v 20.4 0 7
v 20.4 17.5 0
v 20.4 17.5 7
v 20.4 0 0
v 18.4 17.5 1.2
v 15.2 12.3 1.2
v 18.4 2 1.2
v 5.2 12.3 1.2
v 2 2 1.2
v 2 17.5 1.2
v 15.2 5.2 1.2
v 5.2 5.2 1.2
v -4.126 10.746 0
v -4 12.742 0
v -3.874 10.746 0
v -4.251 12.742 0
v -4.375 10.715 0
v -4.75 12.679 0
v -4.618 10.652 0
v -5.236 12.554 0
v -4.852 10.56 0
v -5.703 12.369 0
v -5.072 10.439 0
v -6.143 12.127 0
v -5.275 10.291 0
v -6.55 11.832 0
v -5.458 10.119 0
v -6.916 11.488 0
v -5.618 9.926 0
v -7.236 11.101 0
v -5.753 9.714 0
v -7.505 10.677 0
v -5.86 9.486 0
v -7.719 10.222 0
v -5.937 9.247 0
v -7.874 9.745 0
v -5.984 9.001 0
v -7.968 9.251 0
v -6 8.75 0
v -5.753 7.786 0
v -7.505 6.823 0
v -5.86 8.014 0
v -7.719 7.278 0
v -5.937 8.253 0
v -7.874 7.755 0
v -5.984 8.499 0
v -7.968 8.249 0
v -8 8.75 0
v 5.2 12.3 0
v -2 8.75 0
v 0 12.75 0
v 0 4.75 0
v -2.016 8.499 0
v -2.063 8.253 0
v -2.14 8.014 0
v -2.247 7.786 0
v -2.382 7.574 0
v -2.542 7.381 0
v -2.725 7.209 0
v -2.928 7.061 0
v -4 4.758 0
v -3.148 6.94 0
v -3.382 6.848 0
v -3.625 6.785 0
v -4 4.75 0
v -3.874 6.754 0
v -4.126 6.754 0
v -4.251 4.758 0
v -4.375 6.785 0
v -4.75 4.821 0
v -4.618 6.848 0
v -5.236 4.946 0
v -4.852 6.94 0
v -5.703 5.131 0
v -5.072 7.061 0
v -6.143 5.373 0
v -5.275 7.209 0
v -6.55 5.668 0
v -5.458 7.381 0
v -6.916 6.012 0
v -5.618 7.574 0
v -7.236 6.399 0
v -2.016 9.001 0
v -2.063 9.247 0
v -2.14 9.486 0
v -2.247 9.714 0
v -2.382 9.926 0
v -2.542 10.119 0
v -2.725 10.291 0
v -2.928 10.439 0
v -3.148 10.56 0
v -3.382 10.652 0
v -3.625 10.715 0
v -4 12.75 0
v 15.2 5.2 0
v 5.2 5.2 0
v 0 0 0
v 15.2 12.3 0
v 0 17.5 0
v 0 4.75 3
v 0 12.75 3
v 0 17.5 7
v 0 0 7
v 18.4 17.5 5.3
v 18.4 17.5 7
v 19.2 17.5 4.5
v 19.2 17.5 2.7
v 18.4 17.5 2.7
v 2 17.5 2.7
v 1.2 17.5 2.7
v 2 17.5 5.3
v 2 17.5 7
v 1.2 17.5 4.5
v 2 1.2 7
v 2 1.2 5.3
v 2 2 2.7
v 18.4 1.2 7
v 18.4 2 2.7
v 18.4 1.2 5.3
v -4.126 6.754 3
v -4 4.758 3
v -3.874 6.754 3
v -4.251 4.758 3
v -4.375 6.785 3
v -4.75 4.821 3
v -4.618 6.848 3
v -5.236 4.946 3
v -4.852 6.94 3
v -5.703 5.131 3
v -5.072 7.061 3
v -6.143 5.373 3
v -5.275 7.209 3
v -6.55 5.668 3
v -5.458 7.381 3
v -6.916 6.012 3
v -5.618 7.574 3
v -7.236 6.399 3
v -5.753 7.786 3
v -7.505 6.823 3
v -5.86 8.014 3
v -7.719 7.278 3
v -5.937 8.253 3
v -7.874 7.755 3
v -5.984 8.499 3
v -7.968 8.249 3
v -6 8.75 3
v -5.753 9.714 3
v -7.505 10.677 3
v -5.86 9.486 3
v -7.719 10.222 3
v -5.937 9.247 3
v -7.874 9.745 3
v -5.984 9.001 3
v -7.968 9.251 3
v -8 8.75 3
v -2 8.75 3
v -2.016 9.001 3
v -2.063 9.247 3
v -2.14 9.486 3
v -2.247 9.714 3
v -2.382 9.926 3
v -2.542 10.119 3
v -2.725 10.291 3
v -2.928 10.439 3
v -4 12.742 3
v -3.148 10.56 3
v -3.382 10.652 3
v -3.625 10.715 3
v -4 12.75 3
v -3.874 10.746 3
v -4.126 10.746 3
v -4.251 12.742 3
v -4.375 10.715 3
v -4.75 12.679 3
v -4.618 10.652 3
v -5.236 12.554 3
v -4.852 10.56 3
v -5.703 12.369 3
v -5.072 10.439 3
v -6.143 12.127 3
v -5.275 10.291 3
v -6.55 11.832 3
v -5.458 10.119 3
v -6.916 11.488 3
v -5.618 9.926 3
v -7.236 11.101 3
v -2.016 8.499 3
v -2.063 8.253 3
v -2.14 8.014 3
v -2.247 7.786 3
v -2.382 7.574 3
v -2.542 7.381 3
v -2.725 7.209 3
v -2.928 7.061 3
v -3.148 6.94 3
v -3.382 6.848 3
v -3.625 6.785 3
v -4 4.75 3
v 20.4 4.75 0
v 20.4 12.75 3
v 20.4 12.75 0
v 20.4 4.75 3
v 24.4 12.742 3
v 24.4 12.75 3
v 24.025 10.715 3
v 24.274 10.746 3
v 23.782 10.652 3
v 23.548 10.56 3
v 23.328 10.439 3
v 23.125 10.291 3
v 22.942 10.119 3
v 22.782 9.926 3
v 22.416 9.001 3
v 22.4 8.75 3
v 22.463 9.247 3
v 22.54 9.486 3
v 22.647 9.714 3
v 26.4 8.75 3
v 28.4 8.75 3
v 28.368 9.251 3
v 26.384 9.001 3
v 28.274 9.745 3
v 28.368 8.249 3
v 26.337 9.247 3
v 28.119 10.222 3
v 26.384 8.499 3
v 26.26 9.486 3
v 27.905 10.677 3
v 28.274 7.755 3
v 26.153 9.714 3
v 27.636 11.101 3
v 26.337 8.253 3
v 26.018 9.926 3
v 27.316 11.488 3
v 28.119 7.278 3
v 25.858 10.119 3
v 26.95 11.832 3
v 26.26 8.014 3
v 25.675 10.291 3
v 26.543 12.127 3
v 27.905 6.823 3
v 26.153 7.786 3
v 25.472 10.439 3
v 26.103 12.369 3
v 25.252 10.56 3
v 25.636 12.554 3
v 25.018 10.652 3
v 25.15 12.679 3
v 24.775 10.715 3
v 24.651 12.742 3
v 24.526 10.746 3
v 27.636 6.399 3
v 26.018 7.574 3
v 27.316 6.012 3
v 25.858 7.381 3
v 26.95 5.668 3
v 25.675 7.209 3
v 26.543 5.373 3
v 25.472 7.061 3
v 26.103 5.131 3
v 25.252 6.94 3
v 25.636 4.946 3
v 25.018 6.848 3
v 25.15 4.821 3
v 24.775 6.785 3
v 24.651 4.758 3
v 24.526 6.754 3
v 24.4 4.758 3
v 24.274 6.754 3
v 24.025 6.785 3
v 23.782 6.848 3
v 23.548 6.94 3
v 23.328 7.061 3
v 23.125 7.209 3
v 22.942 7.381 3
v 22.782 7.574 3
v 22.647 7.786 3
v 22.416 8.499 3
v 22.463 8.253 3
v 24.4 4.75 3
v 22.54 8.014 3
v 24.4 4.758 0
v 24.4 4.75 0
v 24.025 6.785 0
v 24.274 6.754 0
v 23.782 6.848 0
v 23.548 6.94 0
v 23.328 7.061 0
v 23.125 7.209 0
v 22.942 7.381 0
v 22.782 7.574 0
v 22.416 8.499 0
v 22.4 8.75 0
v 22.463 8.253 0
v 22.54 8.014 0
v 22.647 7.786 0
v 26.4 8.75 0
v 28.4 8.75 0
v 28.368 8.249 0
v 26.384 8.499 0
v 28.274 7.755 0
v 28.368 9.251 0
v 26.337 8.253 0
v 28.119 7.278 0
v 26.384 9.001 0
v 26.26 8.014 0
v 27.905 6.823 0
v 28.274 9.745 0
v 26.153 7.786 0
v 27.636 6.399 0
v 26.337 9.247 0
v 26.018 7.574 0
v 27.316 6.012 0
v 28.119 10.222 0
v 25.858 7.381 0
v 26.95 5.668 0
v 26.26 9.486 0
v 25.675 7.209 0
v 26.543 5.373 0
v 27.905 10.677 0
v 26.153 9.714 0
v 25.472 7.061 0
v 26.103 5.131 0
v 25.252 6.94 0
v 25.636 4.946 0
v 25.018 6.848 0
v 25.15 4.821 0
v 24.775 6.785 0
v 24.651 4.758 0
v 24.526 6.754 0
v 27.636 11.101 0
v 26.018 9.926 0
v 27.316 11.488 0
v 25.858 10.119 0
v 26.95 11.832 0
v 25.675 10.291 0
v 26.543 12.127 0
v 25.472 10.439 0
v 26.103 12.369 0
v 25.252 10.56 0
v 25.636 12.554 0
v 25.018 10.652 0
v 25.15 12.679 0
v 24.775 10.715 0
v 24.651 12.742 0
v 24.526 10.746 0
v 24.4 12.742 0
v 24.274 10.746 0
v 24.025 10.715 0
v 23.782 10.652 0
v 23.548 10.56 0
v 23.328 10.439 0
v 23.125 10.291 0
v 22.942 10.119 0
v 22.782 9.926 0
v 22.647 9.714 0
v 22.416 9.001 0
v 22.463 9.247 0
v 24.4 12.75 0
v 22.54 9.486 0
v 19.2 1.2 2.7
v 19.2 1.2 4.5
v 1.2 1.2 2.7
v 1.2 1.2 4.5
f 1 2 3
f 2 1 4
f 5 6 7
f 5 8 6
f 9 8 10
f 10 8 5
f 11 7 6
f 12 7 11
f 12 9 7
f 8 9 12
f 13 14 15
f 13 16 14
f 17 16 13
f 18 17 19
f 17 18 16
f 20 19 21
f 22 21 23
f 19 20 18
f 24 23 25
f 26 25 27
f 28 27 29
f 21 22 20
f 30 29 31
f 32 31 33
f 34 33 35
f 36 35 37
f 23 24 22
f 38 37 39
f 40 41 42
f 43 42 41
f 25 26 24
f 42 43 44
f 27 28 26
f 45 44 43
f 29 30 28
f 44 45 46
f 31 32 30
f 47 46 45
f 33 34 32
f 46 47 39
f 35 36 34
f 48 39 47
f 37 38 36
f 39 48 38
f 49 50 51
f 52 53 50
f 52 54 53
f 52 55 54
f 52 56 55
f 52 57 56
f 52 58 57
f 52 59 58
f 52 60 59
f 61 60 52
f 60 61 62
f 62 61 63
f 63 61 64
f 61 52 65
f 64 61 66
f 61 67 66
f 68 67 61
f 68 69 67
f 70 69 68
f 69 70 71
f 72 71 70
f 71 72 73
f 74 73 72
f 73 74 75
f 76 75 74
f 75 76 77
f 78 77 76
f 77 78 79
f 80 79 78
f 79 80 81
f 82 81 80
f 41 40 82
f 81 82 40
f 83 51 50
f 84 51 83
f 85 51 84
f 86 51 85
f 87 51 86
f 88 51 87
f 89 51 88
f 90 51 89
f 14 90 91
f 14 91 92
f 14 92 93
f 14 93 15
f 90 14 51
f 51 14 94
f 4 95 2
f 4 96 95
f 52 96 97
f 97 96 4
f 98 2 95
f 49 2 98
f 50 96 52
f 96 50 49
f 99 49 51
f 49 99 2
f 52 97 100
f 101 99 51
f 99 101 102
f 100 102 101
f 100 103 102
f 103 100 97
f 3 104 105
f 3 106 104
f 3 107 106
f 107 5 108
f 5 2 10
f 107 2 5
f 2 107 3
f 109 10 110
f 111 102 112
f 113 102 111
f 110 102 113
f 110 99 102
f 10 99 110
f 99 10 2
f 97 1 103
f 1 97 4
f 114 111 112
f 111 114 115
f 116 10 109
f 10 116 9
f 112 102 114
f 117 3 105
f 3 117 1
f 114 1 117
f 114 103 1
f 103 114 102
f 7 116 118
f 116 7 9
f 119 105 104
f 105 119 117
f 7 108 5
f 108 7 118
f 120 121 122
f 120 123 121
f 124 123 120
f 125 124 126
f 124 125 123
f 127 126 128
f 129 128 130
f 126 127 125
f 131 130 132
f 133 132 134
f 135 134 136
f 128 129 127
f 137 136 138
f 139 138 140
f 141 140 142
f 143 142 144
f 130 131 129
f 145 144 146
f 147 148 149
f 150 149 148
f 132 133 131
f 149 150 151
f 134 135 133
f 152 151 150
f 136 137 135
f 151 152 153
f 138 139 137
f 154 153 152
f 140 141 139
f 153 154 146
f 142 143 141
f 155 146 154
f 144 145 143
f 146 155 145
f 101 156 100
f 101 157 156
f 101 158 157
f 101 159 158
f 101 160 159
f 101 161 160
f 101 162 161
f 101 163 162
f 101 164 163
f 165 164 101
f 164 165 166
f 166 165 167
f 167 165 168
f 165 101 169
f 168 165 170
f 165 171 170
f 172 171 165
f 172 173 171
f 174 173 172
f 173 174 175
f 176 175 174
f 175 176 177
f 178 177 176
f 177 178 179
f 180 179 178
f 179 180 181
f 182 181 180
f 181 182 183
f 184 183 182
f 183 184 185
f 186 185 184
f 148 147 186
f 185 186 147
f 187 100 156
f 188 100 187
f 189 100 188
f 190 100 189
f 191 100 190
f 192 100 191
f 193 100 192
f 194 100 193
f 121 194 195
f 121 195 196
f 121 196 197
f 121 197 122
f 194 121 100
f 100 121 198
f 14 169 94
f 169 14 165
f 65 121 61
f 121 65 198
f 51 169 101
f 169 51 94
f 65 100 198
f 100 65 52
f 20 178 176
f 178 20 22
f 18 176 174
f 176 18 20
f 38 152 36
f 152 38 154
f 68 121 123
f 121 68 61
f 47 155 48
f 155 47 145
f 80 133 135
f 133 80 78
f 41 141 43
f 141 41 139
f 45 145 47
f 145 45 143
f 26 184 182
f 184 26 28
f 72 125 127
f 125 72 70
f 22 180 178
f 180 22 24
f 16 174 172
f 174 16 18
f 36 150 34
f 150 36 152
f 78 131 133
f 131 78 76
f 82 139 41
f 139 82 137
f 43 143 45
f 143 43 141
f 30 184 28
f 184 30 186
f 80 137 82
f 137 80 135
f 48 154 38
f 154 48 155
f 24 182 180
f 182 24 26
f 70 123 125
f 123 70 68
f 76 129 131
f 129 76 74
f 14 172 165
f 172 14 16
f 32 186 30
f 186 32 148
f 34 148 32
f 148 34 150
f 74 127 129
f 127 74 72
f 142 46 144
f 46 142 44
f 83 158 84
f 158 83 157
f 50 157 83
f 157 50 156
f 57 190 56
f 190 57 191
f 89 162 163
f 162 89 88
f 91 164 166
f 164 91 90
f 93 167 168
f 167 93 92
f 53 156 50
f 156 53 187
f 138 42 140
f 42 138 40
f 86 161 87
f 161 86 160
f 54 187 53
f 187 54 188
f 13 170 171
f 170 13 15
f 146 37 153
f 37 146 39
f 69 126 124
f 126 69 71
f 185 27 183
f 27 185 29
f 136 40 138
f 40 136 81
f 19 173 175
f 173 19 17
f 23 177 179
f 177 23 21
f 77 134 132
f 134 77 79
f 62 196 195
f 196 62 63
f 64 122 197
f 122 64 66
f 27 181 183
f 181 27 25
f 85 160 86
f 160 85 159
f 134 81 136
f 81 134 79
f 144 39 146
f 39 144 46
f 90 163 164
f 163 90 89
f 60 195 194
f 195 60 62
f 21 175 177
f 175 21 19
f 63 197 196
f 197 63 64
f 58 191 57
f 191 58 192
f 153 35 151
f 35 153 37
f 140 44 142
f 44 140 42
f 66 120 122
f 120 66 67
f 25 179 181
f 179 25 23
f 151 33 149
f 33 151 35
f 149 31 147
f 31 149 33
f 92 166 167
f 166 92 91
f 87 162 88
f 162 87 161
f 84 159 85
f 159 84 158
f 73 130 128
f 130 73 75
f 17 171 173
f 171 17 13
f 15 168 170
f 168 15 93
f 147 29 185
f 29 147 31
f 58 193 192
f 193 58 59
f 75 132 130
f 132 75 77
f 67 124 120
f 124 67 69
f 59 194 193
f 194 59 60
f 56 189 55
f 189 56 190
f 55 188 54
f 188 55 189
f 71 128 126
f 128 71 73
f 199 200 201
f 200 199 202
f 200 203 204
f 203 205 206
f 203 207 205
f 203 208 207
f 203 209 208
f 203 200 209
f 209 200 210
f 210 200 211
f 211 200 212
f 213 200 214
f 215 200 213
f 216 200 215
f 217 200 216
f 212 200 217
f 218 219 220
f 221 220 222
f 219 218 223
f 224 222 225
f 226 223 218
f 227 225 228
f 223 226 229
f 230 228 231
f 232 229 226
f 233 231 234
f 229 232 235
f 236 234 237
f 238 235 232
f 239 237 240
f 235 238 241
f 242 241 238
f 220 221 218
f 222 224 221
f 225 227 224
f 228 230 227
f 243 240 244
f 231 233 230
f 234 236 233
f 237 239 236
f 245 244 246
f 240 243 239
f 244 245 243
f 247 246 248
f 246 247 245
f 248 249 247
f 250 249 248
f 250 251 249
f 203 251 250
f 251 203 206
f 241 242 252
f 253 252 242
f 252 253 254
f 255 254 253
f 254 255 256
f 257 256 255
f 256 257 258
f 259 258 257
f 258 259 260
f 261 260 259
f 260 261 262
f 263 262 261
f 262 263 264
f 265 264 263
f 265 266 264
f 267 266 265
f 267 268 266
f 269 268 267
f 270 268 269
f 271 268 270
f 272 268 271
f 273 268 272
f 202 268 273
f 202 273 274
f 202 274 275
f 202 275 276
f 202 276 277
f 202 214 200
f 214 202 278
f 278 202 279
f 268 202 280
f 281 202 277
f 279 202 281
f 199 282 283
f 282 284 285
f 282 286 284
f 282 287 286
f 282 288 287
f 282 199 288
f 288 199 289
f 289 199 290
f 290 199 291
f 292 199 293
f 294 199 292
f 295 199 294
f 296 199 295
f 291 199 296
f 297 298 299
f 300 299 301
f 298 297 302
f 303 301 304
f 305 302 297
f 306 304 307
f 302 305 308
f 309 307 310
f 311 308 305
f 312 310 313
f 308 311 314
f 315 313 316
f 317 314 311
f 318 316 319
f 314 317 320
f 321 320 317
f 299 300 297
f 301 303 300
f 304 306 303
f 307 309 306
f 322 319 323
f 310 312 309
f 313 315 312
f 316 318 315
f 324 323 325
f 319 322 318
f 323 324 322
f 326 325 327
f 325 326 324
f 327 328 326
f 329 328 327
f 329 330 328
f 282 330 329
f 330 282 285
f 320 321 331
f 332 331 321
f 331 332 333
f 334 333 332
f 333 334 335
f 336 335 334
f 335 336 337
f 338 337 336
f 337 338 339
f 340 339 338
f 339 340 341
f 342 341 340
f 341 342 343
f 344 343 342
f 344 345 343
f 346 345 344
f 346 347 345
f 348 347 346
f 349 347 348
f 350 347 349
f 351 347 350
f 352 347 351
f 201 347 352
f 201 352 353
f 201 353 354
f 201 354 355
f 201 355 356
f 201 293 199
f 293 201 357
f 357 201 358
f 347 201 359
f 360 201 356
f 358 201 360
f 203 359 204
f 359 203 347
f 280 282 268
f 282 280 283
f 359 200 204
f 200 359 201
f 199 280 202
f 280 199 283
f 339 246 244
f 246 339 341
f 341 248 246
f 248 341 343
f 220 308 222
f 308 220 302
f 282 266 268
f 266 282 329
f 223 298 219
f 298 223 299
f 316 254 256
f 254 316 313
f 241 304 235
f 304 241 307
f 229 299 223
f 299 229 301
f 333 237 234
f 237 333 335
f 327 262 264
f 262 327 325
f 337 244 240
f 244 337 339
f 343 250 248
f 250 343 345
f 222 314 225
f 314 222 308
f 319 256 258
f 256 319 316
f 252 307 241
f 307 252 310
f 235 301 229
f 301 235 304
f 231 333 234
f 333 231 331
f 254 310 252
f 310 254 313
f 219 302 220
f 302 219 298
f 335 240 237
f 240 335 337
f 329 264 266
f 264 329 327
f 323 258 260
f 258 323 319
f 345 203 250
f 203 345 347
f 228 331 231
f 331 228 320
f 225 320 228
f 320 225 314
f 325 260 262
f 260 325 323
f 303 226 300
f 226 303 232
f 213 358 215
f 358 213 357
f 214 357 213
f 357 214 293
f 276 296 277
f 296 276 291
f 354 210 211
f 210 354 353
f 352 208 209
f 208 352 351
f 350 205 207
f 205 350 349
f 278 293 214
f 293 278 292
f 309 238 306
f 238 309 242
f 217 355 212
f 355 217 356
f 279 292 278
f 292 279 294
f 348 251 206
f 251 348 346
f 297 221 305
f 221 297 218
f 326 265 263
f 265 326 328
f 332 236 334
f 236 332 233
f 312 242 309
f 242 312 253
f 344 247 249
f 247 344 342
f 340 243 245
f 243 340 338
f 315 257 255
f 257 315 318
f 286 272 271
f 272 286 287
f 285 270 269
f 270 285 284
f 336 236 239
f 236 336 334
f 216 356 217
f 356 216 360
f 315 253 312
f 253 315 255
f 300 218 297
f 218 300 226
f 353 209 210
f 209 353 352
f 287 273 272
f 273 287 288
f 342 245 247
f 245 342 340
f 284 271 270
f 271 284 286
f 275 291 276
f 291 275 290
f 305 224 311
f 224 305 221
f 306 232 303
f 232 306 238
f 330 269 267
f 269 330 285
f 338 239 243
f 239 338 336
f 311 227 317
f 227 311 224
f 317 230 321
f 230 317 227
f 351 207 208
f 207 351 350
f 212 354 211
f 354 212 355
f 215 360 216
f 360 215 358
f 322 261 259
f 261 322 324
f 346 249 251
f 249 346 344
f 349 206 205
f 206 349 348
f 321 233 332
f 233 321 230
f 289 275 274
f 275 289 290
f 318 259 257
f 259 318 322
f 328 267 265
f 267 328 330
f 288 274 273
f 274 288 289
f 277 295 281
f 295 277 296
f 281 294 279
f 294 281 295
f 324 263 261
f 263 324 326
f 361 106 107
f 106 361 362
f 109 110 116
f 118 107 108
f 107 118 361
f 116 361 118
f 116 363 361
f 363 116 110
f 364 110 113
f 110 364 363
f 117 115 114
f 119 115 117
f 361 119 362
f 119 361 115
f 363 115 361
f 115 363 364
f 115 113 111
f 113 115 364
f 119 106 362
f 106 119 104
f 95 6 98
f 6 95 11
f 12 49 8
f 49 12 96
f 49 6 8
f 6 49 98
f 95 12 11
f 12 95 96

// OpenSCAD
// file: ../lib/pcb_led_cvf.scad
// for led power module modified

/* bluetooth_mate_holder.scad
 * By John Biehler - November 17, 2011
 * http://www.thingiverse.com/thing:

 * derived from pcb_box_slide_with_tabs.scad
 * By Nicholas C Lewis - Jan 1, 2011
 * http://www.thingiverse.com/thing:5396
 *
 * derived from pcb_box_slide.scad
 *     Parametric, open PCB-box (slide-in) by chlunde
 *     http://www.thingiverse.com/thing:4071
 *
 * CHANGES
 * - adjusted to fit Arduino Mega
 * - added mounting tabs
 * - turned off cutouts
 * - adjusted bottom cutout size
 */

$fn=50;

module pcb_led_cvf(

	pcb_width = 48.2,
	pcb_length =24.1,
	pcb_height =1.1,
	slisse = 0.8,

	pcb_bottom_margin = 1,
	wall_width_thick = 2,
	box_height = 7,

	//tab parameters
	tab_hole_radius=2,
	tab_outer_radius=4,

	inner_margin = 4,

	add_tabs = true

) {
	wall_width = wall_width_thick-slisse;

module tab() {
	difference(){
		union() {
			translate([-tab_outer_radius,-tab_outer_radius,0])
			cube([tab_outer_radius,2*tab_outer_radius,wall_width_thick+1]);
			translate([-tab_outer_radius,0,0])
				cylinder(r=tab_outer_radius, h = wall_width_thick+1);
		}
		translate([-tab_outer_radius,0,0]) {
			cylinder(r= tab_hole_radius, h = wall_width_thick+5,center=true);
		}
	}

}

module box() {
	union() {
		cube([pcb_width + 2*wall_width, pcb_length + 2*wall_width, wall_width]);

		cube([wall_width_thick, pcb_length + 2*wall_width, box_height]);

		cube([pcb_width + 2*wall_width, wall_width_thick, box_height]);

		%translate([0, pcb_length+wall_width, 0])
			cube([pcb_width + 2*wall_width,wall_width,box_height]);

		translate([pcb_width + wall_width - slisse,0,0])
			cube([wall_width_thick, pcb_length + 2*wall_width, box_height]);
	}
	if(add_tabs) {
//comment out this part to remove tabs
		for(i=[(pcb_length + 2*wall_width)/2]){
	translate([0,i,0])tab();
	translate([pcb_width + 2*wall_width,i,0])mirror()tab();
		}
	}

}

module pcb() {
	translate([wall_width, wall_width, wall_width + pcb_bottom_margin])
		cube([pcb_width,pcb_length + wall_width + 0.1,pcb_height]);
	translate([wall_width, wall_width, wall_width + pcb_bottom_margin+pcb_height])rotate([0,45,0])
		cube([pcb_height,pcb_length + wall_width + 0.1,pcb_height]);
	translate([wall_width+pcb_width-2*cos(45)*pcb_height, wall_width, wall_width + pcb_bottom_margin+pcb_height])rotate([0,45,0])
		cube([pcb_height,pcb_length + wall_width + 0.1,pcb_height]);
	translate([wall_width_thick, wall_width, wall_width + pcb_bottom_margin])
		cube([pcb_width-2*slisse,pcb_length + wall_width + 0.1,box_height]);

}



module holes() {
		*translate([wall_width + pcb_width/2, wall_width_thick + 0.1, pcb_width/2+wall_width])
			rotate(a=90,v=[1,0,0])
				cylinder(r=pcb_width/2, h=wall_width_thick + 0.2);

		*translate([-0.1, wall_width + pcb_length/2, pcb_length/2 + wall_width])
			rotate(a=90,v=[0,1,0])
				cylinder(r=pcb_length/2, h=wall_width_thick + 0.2);

		*translate([pcb_width + wall_width - slisse - 0.1, wall_width + pcb_length/2, pcb_length/2 + wall_width])
			rotate(a=90,v=[0,1,0])
				cylinder(r=pcb_length/2, h=wall_width_thick + 0.2);

	 * translate([pcb_width/2 + wall_width, wall_width + pcb_length/2, -0.1])
			rotate(a=0,v=[0,1,0])
				cylinder(r=min(pcb_length,pcb_width)/2 - wall_width/2, h=wall_width_thick + 0.2);

		translate([inner_margin +wall_width, inner_margin+wall_width, -0.1])
			cube([pcb_width-inner_margin*2,pcb_length -inner_margin*2,wall_width + 0.2]);
}

	difference() {
		box();
		pcb();
		holes();
	}
}



pcb_led_cvf();
// main file
use <../lib/pcb_led_cvf.scad>


pcb_led_cvf(
  pcb_length=15.1,
  pcb_width=18,
  pcb_height=1.8,
  pcb_bottom_margin=1.5
);
